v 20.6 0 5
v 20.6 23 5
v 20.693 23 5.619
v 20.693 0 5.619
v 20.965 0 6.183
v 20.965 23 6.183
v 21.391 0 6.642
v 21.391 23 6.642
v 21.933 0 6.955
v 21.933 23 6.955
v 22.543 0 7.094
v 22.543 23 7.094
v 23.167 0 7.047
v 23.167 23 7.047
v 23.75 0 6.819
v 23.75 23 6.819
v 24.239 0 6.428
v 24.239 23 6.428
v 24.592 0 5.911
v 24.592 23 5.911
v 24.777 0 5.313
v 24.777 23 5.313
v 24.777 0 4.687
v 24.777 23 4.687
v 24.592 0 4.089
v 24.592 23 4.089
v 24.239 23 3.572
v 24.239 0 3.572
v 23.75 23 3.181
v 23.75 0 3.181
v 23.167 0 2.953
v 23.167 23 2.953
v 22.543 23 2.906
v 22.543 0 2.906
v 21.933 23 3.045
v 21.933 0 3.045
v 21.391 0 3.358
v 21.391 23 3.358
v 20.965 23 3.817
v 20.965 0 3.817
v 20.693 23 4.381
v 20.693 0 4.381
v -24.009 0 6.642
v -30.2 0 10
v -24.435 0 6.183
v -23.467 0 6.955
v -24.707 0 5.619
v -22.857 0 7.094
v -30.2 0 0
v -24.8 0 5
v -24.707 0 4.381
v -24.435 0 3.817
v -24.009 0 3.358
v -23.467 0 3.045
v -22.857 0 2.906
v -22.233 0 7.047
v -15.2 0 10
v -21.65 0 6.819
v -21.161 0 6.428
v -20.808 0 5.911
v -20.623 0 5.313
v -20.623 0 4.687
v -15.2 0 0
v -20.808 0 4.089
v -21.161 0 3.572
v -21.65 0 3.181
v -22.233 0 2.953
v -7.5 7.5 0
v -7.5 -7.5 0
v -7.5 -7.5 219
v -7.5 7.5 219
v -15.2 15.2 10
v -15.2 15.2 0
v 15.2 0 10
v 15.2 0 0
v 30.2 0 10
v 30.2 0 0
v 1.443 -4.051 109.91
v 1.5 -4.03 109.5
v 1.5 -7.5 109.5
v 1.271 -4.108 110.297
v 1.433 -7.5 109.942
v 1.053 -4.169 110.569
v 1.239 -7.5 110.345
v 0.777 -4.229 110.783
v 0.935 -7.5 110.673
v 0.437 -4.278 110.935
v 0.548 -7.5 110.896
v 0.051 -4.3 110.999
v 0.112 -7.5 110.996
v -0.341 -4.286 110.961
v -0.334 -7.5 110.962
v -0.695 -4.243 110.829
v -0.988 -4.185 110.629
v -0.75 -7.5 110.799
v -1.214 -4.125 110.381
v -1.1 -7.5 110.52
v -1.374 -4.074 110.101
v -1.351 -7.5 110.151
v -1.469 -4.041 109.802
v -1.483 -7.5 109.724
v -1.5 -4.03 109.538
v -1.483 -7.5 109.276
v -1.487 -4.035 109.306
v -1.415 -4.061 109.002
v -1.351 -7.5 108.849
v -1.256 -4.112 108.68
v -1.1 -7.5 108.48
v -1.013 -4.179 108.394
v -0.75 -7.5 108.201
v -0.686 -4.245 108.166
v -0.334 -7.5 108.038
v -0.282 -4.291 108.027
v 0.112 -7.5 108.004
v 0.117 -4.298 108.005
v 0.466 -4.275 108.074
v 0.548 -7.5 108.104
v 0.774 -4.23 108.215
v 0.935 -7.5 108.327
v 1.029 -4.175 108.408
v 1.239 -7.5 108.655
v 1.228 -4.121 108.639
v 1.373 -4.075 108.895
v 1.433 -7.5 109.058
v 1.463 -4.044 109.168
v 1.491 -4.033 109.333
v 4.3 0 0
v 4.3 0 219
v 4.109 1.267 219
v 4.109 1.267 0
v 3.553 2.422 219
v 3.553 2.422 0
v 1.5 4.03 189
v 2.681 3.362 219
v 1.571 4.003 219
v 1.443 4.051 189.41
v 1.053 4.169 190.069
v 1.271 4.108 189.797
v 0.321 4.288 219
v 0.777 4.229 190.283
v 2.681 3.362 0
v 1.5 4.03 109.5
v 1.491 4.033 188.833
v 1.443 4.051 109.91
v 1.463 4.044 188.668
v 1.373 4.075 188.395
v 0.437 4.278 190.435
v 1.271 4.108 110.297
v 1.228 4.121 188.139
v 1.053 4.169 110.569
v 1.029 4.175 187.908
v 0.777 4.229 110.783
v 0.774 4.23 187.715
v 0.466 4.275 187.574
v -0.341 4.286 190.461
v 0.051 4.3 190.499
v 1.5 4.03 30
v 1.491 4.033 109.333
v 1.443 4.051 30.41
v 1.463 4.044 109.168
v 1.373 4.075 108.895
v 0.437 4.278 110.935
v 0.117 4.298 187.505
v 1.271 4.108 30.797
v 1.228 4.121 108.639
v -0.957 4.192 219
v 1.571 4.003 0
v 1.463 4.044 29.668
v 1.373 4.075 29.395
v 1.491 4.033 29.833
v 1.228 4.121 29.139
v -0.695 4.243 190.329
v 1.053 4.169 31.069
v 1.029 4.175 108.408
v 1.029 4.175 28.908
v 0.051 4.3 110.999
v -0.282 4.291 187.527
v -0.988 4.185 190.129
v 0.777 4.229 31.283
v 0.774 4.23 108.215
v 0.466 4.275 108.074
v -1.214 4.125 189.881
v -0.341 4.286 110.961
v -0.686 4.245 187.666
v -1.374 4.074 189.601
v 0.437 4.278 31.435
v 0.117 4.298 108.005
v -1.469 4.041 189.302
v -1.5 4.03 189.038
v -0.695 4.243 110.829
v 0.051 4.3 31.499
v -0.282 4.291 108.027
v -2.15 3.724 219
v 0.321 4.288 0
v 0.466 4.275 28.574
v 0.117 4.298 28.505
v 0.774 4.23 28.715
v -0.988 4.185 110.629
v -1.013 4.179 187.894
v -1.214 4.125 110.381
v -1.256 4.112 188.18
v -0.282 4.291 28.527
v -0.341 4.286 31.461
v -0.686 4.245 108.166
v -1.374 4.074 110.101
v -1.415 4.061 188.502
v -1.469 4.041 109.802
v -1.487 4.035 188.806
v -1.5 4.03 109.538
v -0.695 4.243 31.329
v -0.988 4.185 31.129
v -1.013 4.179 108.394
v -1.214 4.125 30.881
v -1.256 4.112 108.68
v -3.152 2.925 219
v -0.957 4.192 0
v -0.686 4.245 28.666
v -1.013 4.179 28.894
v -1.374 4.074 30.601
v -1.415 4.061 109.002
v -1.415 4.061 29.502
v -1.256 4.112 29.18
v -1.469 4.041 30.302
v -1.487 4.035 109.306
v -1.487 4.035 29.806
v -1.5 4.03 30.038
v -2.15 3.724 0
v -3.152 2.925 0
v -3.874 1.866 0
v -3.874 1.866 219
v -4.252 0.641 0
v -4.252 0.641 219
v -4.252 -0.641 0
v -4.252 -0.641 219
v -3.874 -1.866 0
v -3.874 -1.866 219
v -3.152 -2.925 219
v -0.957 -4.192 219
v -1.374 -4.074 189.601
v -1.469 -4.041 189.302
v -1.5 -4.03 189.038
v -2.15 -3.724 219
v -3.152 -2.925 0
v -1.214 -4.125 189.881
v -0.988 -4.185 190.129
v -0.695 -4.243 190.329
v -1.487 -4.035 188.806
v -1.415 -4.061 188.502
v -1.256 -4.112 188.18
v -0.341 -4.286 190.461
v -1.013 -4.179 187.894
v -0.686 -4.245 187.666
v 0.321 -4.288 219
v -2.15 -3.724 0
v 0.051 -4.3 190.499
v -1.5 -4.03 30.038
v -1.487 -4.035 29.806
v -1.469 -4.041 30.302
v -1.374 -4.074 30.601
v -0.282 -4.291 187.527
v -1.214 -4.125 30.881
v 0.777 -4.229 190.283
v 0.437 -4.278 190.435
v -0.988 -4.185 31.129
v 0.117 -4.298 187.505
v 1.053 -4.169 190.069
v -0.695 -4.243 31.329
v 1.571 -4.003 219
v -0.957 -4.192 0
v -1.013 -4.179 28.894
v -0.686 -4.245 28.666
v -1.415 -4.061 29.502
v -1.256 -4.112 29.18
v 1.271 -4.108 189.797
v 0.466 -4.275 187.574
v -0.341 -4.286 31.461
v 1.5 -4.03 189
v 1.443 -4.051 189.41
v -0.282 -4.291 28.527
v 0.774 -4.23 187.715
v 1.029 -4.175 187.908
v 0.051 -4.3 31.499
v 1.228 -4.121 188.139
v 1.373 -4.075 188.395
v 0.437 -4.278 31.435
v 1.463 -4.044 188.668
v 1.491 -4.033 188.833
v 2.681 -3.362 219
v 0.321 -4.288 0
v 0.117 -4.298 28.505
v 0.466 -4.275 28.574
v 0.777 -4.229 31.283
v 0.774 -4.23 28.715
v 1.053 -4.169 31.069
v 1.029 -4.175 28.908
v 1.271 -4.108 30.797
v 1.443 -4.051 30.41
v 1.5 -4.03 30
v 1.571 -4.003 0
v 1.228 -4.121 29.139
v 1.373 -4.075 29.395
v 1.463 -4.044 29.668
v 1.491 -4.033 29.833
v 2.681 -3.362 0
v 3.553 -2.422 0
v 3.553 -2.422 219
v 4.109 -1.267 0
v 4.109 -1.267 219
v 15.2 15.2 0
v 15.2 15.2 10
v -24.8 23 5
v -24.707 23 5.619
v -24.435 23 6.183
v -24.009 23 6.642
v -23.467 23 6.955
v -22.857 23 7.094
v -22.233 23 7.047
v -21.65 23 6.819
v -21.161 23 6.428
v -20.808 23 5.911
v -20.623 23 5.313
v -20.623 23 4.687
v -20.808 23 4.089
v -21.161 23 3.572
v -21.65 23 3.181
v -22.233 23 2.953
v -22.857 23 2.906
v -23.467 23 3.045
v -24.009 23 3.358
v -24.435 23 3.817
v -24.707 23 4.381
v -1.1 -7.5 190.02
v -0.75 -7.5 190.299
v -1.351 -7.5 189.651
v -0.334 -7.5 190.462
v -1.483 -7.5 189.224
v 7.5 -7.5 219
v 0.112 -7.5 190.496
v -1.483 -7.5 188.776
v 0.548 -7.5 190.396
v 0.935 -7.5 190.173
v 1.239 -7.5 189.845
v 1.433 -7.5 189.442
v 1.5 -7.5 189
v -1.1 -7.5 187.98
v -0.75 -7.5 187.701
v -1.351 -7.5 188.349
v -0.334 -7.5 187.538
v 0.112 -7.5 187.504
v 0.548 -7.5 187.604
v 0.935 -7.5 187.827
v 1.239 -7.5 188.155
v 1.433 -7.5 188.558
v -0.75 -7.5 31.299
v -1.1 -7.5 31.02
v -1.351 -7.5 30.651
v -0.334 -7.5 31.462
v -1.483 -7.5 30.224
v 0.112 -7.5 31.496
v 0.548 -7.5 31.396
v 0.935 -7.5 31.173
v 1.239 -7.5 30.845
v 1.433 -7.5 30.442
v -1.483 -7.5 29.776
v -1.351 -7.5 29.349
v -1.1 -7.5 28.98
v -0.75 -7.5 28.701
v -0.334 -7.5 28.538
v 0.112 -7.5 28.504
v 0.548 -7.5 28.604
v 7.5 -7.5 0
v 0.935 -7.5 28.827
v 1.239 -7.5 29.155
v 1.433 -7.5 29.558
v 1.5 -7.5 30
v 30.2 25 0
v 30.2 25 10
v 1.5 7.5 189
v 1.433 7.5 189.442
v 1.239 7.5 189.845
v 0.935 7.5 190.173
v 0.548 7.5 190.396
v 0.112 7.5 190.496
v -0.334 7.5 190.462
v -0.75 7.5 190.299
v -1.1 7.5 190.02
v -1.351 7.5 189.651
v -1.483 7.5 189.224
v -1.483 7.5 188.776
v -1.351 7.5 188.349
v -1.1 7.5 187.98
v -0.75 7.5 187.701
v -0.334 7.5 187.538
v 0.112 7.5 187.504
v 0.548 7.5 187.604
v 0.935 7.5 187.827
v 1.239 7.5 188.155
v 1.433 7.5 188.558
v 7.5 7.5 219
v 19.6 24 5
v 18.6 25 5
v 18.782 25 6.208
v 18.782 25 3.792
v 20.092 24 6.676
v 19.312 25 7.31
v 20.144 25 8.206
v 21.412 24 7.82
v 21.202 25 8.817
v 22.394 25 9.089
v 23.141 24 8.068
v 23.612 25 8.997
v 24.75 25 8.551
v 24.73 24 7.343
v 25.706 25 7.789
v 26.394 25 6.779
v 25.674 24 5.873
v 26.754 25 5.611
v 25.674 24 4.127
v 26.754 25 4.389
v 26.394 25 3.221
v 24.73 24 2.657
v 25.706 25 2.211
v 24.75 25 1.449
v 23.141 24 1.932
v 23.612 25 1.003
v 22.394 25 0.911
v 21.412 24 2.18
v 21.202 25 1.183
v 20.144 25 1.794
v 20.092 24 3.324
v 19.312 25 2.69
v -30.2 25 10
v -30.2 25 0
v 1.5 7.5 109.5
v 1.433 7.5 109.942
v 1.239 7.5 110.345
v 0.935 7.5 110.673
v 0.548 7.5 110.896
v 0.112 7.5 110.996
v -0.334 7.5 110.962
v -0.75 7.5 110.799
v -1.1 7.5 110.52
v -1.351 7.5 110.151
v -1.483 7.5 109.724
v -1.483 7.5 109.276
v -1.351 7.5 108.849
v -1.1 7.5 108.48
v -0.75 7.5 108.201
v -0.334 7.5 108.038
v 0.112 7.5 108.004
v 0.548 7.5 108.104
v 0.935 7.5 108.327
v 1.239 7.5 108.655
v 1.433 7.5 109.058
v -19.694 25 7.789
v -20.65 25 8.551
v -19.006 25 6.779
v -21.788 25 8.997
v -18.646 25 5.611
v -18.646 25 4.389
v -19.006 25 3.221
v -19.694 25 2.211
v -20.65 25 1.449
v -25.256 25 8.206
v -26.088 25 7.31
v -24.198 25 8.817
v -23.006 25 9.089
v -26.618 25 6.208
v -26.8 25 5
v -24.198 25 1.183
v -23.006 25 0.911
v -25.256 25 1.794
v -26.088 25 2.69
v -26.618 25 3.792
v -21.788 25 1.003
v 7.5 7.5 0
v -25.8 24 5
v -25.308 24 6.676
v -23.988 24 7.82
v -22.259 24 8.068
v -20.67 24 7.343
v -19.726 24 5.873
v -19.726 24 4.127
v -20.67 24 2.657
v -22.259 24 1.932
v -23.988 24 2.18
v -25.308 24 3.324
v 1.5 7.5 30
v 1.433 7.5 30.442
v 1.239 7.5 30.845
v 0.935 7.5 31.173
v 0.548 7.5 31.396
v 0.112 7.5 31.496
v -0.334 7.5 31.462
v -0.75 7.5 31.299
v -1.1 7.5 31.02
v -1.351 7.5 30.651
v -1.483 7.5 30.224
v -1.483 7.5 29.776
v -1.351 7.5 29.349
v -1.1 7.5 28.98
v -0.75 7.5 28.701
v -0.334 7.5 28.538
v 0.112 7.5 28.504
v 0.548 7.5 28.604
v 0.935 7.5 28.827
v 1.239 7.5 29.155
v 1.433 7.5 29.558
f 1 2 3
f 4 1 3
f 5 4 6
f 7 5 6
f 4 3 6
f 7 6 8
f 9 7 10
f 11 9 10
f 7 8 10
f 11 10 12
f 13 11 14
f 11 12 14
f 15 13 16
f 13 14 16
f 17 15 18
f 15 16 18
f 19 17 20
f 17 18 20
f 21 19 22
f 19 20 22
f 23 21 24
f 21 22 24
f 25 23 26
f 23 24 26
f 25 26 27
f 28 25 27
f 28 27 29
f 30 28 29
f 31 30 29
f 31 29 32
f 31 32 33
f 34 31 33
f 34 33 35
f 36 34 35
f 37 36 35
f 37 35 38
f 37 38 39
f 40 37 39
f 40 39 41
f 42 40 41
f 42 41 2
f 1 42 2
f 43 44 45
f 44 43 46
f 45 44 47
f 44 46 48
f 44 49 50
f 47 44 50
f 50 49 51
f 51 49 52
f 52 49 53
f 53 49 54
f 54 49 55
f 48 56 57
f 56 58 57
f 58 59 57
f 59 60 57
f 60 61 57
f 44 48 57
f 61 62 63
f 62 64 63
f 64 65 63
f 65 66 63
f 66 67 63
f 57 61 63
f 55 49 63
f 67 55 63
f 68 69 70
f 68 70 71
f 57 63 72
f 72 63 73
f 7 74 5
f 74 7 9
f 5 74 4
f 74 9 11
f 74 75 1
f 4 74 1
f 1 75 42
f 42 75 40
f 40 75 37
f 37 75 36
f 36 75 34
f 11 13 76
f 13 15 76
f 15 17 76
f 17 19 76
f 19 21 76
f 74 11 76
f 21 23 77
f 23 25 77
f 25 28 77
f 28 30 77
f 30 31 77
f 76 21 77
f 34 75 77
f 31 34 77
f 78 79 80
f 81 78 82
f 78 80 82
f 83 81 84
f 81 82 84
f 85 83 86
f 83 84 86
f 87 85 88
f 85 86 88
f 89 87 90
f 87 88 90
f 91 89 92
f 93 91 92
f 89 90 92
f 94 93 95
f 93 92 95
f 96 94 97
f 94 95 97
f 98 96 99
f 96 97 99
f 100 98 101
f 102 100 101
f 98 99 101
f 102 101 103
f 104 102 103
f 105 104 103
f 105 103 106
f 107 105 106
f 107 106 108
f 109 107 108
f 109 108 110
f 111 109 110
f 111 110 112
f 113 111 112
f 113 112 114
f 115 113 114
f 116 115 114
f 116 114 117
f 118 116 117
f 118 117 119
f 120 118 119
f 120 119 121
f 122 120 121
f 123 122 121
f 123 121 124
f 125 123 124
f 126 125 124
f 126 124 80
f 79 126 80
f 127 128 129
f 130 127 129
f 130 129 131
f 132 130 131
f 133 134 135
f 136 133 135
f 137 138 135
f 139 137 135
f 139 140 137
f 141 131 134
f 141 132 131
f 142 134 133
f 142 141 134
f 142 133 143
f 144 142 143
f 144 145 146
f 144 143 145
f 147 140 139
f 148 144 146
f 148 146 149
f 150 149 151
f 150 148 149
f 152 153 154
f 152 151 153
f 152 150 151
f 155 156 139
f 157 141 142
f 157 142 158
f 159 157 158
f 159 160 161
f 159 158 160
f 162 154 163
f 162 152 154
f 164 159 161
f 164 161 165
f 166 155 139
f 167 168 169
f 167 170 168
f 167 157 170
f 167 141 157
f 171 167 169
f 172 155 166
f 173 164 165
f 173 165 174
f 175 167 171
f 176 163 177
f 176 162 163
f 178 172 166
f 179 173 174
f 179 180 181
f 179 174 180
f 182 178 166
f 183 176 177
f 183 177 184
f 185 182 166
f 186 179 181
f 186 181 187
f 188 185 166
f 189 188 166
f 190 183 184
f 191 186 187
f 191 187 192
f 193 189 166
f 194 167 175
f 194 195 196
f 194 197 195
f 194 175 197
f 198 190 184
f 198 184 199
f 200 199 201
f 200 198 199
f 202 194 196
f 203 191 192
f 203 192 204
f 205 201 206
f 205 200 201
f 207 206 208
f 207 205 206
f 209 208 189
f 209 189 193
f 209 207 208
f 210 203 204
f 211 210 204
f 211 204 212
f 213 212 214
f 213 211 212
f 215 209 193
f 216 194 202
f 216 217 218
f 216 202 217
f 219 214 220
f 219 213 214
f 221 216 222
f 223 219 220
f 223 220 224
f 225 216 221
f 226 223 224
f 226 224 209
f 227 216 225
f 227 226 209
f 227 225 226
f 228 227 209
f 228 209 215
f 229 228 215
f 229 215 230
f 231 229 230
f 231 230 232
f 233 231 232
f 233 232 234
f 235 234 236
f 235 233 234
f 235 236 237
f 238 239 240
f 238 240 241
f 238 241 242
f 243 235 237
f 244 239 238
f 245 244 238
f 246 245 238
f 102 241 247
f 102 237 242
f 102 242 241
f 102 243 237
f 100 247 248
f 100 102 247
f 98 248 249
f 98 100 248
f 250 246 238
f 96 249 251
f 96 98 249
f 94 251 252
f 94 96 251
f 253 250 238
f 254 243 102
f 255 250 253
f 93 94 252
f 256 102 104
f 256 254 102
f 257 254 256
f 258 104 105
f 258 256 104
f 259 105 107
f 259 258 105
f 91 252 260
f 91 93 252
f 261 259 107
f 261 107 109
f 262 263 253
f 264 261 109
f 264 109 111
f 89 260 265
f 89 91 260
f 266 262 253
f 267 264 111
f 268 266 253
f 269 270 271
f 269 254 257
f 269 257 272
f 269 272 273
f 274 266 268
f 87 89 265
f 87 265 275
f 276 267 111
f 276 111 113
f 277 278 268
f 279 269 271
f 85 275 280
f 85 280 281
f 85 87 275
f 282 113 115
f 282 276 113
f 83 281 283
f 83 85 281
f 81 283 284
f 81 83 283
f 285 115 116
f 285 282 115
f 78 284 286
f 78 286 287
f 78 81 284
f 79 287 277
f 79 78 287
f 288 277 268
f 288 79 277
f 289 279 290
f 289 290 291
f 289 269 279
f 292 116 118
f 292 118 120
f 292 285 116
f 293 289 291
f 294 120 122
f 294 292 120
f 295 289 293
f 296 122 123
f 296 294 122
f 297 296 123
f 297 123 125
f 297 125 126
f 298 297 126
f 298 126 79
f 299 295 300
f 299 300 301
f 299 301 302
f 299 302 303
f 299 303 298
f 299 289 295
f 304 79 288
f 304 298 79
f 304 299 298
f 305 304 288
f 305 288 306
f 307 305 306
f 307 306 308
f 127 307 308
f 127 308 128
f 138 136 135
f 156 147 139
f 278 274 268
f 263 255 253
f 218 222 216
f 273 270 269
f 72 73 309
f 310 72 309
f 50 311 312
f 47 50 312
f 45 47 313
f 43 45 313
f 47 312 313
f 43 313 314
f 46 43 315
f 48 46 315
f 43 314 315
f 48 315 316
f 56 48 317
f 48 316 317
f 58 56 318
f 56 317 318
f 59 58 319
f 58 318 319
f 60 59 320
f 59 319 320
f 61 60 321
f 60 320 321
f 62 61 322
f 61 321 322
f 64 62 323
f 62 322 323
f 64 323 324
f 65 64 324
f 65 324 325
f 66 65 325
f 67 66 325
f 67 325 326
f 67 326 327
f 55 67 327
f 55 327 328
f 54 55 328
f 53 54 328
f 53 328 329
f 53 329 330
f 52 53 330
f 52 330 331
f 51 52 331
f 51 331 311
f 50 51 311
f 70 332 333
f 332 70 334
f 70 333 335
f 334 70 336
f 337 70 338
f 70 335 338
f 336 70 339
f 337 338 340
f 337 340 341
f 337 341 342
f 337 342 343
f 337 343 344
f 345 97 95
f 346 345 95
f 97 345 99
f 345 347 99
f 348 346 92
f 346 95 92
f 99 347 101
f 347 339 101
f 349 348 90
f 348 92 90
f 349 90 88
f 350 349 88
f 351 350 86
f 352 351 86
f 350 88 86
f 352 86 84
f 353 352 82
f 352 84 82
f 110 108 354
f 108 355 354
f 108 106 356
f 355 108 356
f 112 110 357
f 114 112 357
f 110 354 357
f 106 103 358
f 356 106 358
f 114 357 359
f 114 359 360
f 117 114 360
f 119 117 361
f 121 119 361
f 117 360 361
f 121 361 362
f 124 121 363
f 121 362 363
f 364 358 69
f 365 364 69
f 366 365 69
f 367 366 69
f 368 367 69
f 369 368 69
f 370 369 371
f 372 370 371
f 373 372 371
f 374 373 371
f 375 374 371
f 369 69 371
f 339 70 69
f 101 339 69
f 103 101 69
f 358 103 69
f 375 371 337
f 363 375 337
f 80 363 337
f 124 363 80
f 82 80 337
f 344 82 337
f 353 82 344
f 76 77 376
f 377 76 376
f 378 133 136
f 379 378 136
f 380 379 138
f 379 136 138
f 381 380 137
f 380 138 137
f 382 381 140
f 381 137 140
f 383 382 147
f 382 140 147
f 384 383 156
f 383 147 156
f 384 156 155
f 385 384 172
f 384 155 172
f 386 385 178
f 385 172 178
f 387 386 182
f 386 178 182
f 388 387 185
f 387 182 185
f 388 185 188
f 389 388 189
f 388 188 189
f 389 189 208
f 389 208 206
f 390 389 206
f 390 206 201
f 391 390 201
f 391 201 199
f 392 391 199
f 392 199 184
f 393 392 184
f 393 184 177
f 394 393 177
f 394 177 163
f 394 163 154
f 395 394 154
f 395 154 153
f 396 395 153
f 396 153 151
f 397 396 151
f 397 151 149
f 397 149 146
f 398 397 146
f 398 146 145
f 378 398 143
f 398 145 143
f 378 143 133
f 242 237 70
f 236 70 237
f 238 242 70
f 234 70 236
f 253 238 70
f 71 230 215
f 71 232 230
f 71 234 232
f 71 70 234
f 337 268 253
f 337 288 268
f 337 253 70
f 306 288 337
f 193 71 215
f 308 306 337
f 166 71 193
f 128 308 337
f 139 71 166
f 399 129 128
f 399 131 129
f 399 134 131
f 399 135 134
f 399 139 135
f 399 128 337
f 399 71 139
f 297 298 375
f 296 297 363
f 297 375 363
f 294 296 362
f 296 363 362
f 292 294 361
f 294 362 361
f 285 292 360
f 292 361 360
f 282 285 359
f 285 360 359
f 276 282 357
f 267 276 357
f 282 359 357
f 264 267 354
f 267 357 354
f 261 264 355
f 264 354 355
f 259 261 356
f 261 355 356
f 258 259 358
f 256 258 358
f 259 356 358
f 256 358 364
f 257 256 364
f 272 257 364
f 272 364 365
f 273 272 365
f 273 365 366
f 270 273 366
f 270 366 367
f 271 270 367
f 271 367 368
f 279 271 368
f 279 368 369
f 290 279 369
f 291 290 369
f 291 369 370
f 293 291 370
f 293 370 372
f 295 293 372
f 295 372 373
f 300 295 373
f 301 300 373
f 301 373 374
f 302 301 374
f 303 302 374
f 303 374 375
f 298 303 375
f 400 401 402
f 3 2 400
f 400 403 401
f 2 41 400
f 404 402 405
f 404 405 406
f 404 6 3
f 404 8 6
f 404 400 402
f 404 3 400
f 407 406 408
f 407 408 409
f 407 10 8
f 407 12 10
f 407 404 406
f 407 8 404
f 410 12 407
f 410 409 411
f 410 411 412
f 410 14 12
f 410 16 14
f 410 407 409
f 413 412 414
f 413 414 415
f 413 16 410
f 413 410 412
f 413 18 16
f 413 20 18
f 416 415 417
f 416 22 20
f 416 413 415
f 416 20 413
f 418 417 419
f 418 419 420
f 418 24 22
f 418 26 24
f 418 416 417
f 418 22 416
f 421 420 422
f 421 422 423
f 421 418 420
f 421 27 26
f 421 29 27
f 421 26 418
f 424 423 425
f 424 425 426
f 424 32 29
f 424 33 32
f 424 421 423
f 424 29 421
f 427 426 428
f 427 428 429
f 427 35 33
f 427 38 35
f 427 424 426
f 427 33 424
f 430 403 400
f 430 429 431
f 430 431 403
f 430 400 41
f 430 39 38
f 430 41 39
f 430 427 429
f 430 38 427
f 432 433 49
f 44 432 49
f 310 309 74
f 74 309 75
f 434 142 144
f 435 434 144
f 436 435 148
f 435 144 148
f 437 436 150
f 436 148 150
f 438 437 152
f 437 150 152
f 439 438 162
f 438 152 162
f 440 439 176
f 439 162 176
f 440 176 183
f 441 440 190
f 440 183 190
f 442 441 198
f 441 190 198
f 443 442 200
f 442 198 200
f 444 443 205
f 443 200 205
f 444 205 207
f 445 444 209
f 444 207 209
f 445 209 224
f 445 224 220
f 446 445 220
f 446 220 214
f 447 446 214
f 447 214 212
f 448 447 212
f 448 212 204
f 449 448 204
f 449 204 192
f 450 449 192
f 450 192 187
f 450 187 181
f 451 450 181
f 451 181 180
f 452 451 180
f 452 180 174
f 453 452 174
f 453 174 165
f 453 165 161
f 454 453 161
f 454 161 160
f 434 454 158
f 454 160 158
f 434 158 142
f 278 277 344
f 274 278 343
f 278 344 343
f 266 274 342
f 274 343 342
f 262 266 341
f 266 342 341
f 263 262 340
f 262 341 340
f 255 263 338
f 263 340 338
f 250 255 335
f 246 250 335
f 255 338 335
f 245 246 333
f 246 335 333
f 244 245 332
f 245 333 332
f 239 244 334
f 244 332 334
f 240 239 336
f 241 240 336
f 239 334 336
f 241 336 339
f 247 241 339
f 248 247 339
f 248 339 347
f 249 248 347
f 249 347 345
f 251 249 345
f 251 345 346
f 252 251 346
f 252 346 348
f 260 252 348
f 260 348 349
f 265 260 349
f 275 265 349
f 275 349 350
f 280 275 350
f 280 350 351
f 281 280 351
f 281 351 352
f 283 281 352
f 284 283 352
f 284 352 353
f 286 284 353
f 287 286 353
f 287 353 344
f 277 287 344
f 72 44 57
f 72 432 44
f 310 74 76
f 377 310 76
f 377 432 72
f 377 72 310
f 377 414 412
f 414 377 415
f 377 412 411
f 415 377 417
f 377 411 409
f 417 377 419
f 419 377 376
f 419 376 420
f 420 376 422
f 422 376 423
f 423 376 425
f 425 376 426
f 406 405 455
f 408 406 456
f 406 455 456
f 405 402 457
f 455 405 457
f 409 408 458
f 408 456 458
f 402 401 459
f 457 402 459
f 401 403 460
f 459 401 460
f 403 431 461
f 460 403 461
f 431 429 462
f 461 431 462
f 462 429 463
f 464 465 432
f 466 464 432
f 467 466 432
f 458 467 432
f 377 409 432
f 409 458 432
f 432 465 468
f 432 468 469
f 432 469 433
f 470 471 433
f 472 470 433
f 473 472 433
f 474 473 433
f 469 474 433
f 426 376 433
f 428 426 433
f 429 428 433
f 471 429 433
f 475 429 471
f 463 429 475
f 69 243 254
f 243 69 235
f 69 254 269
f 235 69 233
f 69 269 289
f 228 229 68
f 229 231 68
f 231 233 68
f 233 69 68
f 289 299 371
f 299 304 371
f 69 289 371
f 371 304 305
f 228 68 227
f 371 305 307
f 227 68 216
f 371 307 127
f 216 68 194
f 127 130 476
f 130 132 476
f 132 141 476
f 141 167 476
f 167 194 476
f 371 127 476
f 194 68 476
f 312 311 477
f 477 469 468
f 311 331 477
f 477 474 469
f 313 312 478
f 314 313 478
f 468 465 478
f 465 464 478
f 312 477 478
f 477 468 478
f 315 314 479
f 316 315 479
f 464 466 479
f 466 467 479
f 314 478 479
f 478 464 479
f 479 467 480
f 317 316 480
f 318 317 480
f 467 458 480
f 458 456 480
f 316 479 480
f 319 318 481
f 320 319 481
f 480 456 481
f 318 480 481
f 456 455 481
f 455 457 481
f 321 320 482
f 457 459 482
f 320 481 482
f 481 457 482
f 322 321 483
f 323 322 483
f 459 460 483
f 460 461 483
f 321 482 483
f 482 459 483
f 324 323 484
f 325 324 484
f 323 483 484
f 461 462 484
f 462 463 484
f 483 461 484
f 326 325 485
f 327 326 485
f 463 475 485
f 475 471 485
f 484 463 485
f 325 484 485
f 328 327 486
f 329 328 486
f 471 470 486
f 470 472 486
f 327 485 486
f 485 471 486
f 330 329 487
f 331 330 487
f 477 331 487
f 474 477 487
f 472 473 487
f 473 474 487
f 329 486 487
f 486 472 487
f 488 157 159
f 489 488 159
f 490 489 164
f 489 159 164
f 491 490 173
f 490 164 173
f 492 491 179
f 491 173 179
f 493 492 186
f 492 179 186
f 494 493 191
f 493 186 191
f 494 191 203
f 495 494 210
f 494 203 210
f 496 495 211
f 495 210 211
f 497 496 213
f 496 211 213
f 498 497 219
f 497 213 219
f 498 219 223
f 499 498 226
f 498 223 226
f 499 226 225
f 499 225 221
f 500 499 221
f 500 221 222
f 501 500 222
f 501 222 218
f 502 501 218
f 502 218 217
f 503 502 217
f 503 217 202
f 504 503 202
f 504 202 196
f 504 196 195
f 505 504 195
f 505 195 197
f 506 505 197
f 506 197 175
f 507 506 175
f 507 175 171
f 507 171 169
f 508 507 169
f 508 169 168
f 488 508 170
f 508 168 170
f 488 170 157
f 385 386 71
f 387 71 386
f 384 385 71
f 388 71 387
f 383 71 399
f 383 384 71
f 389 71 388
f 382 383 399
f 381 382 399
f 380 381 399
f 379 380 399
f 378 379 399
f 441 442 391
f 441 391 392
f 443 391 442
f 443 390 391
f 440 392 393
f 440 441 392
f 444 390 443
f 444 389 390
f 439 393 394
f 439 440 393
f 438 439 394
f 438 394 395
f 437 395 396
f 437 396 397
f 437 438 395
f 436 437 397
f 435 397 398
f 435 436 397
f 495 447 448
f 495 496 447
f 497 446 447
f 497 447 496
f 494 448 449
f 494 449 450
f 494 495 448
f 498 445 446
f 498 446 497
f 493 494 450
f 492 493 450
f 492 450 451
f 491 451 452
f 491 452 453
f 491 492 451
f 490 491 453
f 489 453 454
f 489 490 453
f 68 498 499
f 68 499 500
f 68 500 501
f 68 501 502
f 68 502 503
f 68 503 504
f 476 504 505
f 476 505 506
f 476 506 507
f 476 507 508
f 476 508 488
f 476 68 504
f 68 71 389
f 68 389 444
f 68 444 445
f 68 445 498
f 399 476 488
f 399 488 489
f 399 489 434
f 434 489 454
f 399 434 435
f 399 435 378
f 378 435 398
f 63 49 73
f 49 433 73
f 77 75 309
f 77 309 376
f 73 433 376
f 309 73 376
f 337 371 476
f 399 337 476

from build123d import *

# Parameters (mm, degrees)
SKETCH_W        = 15
SKETCH_H        = 15
SKETCH_R        = 4.3
PAD_DEPTH       = 219
SKETCH001_R     = 1.5
POCKET_DEPTH    = 15.001
PAD001_DEPTH    = 10
SKETCH003_R     = 2.1
POCKET001_DEPTH = 25.001
CHAMFER_SIZE    = 2


with BuildPart() as body:
    # Sketch → Pad (new body)
    with BuildSketch(Plane.XY):
        Rectangle(SKETCH_W, SKETCH_H)
        Circle(SKETCH_R, mode=Mode.SUBTRACT)
    extrude(amount=PAD_DEPTH)

    # Sketch001 (on Face1 of Pad) → Pocket (cut, through all)
    with BuildSketch(Plane.XZ.offset(7.5)):
        with Locations((0, 109.5)):
            Circle(SKETCH001_R)
        with Locations((0, 30)):
            Circle(SKETCH001_R)
        with Locations((0, 189)):
            Circle(SKETCH001_R)
    extrude(amount=-POCKET_DEPTH, mode=Mode.SUBTRACT)


with BuildPart() as body001:
    # Sketch002 → Pad001 (new body)
    with BuildSketch(Plane.XY):
        Polygon((-30.2, 0), (-15.2, 0), (-15.2, 15.2), (0, 15.2), (15.2, 15.2), (15.2, 0), (30.2, 0), (30.2, 25), (-30.2, 25), align=None)
    extrude(amount=PAD001_DEPTH)

    # Sketch003 (on Face7 of Pad001) → Pocket001 (cut, through all)
    with BuildSketch(Plane(origin=(0, 25, 0), x_dir=(-1, 0, 0), z_dir=(0, 1, 0))):
        with Locations((-22.7, 5)):
            Circle(SKETCH003_R)
        with Locations((22.7, 5)):
            Circle(SKETCH003_R)
    extrude(amount=-POCKET001_DEPTH, mode=Mode.SUBTRACT)

    # Chamfer
    chamfer_edges = [body001.edges().sort_by_distance(p)[0] for p in [
        (24.8, 25, 5),
        (-20.6, 25, 5),
    ]]
    chamfer(chamfer_edges, length=CHAMFER_SIZE)


solid = Compound([body.part, body001.part])
